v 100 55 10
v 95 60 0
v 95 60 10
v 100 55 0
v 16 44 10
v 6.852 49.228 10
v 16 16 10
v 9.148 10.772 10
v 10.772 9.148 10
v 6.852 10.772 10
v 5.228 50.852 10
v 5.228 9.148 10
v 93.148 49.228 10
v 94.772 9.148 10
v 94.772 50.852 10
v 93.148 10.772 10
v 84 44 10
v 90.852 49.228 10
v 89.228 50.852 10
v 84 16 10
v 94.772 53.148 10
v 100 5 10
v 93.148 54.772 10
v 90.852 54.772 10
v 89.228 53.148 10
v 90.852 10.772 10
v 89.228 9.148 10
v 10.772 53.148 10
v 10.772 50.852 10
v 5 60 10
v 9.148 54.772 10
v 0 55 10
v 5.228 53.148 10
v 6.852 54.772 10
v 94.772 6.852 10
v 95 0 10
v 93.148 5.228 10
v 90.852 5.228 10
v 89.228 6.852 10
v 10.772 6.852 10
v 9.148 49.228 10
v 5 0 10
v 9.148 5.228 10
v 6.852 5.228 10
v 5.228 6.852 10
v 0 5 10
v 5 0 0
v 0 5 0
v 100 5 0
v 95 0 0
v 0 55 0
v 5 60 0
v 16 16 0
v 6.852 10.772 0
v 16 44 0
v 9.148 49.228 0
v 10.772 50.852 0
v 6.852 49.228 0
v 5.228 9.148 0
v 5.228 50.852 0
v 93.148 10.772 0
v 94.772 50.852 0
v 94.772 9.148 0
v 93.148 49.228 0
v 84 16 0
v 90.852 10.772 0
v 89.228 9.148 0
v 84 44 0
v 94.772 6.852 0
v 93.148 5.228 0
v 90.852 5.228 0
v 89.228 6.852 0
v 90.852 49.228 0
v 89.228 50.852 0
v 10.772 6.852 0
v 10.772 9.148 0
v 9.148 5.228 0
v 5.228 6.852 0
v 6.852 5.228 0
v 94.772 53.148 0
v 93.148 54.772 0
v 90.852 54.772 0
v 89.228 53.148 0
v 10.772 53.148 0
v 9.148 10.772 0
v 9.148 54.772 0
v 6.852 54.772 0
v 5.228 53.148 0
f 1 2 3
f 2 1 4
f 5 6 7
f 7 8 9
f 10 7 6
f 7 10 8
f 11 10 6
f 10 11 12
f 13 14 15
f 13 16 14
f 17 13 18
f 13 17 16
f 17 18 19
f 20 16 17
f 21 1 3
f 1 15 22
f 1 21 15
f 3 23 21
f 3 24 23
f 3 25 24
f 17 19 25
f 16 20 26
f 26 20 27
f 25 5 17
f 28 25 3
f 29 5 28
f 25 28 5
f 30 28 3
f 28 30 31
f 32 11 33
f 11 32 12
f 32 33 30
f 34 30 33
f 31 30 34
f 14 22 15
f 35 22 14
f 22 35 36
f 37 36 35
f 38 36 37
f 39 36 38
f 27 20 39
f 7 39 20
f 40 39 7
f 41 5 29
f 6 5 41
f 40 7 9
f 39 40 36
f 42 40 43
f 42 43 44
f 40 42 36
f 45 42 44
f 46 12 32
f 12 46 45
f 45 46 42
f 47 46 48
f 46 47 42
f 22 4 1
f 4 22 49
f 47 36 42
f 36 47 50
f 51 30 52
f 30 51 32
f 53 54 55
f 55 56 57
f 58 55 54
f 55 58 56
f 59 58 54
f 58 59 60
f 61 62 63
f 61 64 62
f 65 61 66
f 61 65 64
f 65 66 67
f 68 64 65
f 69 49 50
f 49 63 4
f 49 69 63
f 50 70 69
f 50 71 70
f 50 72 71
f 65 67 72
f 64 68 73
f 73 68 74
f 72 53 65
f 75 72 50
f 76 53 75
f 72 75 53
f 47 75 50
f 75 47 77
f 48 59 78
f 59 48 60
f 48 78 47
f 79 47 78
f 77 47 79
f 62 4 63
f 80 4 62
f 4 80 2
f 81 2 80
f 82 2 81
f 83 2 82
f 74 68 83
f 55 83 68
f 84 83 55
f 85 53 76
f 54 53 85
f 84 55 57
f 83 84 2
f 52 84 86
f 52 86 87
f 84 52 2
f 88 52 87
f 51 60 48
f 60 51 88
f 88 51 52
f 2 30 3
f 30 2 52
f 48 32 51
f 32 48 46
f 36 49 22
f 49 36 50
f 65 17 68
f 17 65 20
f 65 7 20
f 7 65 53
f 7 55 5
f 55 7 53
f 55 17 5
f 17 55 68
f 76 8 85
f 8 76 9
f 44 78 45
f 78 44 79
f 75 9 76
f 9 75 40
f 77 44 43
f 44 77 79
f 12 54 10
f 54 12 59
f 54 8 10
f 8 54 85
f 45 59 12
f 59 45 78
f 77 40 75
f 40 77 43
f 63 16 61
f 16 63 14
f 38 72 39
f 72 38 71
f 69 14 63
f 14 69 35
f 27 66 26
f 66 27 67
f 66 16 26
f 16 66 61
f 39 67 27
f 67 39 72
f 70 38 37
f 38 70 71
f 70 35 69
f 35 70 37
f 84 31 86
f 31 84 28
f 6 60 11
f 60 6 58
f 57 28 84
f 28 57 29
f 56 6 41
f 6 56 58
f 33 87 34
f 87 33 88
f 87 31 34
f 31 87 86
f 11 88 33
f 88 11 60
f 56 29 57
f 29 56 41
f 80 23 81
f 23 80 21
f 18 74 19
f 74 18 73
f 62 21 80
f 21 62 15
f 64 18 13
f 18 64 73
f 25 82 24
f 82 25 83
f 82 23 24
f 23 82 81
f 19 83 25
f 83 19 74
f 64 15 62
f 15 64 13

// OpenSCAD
$fn = 32;

// ----------------------------------------------------------------------
// Frame plate: 100 x 60 frame, 16 mm rails
// ----------------------------------------------------------------------

// --- parameters (mm) ---
plate_l = 100;            // plate length, X
plate_w = 60;             // plate width, Y
plate_t = 10;             // plate thickness, Z (extrusion height)
corner_c = 5;             // corner chamfer
frame_bar = 16;           // frame rail width
bolt_r = 3;               // corner bolt window radius
bolt_inset = 8;           // bolt centre inset from the edges

win_l = plate_l - 2 * frame_bar;  // window length
win_w = plate_w - 2 * frame_bar;  // window width
bolt_d = 2 * bolt_r;  // corner hole diameter

profile = [[5, 0], [95, 0], [100, 5], [100, 55], [95, 60], [5, 60], [0, 55], [0, 5]];  // primary outline, 8 points, counter clockwise
void_1 = [[16, 16], [84, 16], [84, 44], [16, 44]];  // the window, 4 points
void_2 = [[10.772, 9.148], [9.148, 10.772], [6.852, 10.772], [5.228, 9.148], [5.228, 6.852], [6.852, 5.228], [9.148, 5.228], [10.772, 6.852]];  // corner bolt window, 8 points
void_3 = [[94.772, 9.148], [93.148, 10.772], [90.852, 10.772], [89.228, 9.148], [89.228, 6.852], [90.852, 5.228], [93.148, 5.228], [94.772, 6.852]];  // corner bolt window, 8 points
void_4 = [[10.772, 53.148], [9.148, 54.772], [6.852, 54.772], [5.228, 53.148], [5.228, 50.852], [6.852, 49.228], [9.148, 49.228], [10.772, 50.852]];  // corner bolt window, 8 points
void_5 = [[94.772, 53.148], [93.148, 54.772], [90.852, 54.772], [89.228, 53.148], [89.228, 50.852], [90.852, 49.228], [93.148, 49.228], [94.772, 50.852]];  // corner bolt window, 8 points

// --- the one profile operation ---
difference() {
  linear_extrude(height = plate_t) polygon(points = profile);
  translate([0, 0, -1])
    linear_extrude(height = plate_t + 2) polygon(points = void_1);
  translate([0, 0, -1])
    linear_extrude(height = plate_t + 2) polygon(points = void_2);
  translate([0, 0, -1])
    linear_extrude(height = plate_t + 2) polygon(points = void_3);
  translate([0, 0, -1])
    linear_extrude(height = plate_t + 2) polygon(points = void_4);
  translate([0, 0, -1])
    linear_extrude(height = plate_t + 2) polygon(points = void_5);
}
